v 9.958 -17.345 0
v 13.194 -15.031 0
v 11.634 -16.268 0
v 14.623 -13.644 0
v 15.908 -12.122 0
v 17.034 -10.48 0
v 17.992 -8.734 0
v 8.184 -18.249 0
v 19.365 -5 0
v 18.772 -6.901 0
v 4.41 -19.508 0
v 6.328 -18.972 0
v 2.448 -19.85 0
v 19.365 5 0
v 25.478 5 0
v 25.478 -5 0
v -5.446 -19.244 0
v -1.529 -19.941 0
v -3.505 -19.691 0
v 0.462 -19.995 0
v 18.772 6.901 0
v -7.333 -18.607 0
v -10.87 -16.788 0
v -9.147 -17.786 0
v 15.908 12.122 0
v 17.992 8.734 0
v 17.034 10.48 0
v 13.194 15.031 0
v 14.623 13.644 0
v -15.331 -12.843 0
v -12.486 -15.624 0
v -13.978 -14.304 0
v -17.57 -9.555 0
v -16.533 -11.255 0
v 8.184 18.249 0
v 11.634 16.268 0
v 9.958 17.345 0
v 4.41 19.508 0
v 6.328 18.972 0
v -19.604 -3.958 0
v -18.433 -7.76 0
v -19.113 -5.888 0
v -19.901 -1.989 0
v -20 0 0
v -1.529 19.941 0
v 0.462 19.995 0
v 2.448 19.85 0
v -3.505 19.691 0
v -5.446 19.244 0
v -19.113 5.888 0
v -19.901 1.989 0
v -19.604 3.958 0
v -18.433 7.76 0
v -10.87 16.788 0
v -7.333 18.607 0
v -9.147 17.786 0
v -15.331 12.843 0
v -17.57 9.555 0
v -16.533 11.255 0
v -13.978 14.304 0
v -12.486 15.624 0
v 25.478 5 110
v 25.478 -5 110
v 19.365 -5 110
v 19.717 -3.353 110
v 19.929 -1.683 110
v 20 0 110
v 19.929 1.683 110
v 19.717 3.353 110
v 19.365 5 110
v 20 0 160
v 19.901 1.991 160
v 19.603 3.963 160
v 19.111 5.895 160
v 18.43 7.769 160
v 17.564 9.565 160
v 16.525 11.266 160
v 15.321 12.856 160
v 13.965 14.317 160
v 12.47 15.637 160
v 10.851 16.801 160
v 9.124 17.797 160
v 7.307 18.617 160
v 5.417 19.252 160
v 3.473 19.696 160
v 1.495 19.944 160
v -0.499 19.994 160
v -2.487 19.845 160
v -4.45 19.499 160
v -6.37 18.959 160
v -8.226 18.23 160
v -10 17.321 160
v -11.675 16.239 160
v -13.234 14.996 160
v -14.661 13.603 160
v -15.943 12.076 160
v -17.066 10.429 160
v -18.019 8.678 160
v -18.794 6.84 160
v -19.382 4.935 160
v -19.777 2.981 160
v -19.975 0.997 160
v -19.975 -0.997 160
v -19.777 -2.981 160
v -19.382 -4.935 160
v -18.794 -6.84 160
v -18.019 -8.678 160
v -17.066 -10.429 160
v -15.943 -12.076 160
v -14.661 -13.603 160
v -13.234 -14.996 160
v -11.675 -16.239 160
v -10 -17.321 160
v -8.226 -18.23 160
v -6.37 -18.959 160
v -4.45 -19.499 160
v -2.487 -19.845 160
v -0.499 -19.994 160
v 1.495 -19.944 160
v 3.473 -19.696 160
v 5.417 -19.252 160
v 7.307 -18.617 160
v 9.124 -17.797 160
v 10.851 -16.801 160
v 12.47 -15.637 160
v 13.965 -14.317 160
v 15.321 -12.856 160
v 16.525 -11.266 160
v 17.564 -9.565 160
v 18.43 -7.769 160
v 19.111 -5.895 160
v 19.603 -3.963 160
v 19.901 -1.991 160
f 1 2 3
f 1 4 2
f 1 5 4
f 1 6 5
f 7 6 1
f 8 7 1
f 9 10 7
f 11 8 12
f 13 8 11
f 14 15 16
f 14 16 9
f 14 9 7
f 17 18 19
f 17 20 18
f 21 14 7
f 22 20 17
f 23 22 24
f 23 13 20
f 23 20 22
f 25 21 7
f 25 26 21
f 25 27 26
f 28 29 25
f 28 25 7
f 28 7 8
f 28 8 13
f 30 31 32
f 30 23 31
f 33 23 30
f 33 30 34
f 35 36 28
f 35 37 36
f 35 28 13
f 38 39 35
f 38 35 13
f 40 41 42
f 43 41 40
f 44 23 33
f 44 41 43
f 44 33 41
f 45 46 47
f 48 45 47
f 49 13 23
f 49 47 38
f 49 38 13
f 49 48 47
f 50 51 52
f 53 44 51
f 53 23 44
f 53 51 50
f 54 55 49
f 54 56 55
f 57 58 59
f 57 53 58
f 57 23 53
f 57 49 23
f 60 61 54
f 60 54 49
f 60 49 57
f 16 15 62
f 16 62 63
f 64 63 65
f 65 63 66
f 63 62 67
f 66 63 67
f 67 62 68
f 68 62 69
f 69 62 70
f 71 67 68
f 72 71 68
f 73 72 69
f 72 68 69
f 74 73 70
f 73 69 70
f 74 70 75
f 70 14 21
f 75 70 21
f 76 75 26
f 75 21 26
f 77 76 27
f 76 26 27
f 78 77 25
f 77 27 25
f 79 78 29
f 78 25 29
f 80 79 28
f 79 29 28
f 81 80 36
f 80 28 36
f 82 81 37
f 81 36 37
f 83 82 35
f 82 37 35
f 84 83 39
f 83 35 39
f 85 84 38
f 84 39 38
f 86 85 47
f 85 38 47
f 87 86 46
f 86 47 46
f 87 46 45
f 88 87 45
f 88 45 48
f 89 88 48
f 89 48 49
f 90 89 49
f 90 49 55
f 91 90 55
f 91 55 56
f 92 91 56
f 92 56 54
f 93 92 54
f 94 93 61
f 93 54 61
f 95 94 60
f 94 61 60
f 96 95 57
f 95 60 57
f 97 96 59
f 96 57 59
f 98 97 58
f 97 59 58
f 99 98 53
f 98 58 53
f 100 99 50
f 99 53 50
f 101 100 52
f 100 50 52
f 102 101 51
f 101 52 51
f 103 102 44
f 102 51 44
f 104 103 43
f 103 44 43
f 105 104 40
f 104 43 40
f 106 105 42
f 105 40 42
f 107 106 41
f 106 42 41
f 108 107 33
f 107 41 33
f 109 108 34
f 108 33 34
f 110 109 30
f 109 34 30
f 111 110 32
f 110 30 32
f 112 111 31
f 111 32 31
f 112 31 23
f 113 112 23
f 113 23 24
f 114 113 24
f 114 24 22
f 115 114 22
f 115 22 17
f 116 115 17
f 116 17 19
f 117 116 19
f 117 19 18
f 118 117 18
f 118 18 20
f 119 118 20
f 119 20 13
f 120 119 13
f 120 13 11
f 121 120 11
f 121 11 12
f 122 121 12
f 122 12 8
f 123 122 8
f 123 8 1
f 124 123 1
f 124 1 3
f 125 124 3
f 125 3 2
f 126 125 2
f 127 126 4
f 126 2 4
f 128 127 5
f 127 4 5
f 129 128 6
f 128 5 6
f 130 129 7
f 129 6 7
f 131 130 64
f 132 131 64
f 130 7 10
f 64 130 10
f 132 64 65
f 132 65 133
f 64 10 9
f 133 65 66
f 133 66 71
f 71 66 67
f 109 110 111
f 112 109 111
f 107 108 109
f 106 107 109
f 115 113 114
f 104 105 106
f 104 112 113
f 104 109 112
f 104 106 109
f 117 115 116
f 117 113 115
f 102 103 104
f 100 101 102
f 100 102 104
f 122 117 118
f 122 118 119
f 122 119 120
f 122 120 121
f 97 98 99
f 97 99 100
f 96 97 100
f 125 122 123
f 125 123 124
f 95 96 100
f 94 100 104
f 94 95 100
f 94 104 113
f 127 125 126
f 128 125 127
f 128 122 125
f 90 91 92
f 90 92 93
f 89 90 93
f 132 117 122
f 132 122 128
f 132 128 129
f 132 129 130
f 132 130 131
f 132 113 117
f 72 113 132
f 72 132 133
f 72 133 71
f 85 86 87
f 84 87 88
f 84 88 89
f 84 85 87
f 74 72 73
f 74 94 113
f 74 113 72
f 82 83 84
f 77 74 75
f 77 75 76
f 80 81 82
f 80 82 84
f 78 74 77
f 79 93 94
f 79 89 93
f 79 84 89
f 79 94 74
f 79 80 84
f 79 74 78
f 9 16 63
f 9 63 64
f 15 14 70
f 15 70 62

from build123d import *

# Parameters (mm, degrees)
SKETCH1_R           = 20
BOSS_EXTRUDE1_DEPTH = 160
BOSS_EXTRUDE2_DEPTH = 110


with BuildPart() as part:
    # Sketch1 → Boss-Extrude1 (new body)
    with BuildSketch(Plane.XY):
        Circle(SKETCH1_R)
    extrude(amount=BOSS_EXTRUDE1_DEPTH)

    # Sketch2 → Boss-Extrude2 (add)
    with BuildSketch(Plane(origin=(0, 0, 0), x_dir=(-1, 0, 0), z_dir=(0, 0, -1))):
        with BuildLine():
            Line((-19.364916731, 5), (-25.478218102, 5))
            Line((-25.478218102, 5), (-25.478218102, -5))
            Line((-25.478218102, -5), (-19.364916731, -5))
            ThreePointArc((-19.364916731, -5), (-20, 0), (-19.364916731, 5))
        make_face()
    extrude(amount=-BOSS_EXTRUDE2_DEPTH)


solid = part.part
